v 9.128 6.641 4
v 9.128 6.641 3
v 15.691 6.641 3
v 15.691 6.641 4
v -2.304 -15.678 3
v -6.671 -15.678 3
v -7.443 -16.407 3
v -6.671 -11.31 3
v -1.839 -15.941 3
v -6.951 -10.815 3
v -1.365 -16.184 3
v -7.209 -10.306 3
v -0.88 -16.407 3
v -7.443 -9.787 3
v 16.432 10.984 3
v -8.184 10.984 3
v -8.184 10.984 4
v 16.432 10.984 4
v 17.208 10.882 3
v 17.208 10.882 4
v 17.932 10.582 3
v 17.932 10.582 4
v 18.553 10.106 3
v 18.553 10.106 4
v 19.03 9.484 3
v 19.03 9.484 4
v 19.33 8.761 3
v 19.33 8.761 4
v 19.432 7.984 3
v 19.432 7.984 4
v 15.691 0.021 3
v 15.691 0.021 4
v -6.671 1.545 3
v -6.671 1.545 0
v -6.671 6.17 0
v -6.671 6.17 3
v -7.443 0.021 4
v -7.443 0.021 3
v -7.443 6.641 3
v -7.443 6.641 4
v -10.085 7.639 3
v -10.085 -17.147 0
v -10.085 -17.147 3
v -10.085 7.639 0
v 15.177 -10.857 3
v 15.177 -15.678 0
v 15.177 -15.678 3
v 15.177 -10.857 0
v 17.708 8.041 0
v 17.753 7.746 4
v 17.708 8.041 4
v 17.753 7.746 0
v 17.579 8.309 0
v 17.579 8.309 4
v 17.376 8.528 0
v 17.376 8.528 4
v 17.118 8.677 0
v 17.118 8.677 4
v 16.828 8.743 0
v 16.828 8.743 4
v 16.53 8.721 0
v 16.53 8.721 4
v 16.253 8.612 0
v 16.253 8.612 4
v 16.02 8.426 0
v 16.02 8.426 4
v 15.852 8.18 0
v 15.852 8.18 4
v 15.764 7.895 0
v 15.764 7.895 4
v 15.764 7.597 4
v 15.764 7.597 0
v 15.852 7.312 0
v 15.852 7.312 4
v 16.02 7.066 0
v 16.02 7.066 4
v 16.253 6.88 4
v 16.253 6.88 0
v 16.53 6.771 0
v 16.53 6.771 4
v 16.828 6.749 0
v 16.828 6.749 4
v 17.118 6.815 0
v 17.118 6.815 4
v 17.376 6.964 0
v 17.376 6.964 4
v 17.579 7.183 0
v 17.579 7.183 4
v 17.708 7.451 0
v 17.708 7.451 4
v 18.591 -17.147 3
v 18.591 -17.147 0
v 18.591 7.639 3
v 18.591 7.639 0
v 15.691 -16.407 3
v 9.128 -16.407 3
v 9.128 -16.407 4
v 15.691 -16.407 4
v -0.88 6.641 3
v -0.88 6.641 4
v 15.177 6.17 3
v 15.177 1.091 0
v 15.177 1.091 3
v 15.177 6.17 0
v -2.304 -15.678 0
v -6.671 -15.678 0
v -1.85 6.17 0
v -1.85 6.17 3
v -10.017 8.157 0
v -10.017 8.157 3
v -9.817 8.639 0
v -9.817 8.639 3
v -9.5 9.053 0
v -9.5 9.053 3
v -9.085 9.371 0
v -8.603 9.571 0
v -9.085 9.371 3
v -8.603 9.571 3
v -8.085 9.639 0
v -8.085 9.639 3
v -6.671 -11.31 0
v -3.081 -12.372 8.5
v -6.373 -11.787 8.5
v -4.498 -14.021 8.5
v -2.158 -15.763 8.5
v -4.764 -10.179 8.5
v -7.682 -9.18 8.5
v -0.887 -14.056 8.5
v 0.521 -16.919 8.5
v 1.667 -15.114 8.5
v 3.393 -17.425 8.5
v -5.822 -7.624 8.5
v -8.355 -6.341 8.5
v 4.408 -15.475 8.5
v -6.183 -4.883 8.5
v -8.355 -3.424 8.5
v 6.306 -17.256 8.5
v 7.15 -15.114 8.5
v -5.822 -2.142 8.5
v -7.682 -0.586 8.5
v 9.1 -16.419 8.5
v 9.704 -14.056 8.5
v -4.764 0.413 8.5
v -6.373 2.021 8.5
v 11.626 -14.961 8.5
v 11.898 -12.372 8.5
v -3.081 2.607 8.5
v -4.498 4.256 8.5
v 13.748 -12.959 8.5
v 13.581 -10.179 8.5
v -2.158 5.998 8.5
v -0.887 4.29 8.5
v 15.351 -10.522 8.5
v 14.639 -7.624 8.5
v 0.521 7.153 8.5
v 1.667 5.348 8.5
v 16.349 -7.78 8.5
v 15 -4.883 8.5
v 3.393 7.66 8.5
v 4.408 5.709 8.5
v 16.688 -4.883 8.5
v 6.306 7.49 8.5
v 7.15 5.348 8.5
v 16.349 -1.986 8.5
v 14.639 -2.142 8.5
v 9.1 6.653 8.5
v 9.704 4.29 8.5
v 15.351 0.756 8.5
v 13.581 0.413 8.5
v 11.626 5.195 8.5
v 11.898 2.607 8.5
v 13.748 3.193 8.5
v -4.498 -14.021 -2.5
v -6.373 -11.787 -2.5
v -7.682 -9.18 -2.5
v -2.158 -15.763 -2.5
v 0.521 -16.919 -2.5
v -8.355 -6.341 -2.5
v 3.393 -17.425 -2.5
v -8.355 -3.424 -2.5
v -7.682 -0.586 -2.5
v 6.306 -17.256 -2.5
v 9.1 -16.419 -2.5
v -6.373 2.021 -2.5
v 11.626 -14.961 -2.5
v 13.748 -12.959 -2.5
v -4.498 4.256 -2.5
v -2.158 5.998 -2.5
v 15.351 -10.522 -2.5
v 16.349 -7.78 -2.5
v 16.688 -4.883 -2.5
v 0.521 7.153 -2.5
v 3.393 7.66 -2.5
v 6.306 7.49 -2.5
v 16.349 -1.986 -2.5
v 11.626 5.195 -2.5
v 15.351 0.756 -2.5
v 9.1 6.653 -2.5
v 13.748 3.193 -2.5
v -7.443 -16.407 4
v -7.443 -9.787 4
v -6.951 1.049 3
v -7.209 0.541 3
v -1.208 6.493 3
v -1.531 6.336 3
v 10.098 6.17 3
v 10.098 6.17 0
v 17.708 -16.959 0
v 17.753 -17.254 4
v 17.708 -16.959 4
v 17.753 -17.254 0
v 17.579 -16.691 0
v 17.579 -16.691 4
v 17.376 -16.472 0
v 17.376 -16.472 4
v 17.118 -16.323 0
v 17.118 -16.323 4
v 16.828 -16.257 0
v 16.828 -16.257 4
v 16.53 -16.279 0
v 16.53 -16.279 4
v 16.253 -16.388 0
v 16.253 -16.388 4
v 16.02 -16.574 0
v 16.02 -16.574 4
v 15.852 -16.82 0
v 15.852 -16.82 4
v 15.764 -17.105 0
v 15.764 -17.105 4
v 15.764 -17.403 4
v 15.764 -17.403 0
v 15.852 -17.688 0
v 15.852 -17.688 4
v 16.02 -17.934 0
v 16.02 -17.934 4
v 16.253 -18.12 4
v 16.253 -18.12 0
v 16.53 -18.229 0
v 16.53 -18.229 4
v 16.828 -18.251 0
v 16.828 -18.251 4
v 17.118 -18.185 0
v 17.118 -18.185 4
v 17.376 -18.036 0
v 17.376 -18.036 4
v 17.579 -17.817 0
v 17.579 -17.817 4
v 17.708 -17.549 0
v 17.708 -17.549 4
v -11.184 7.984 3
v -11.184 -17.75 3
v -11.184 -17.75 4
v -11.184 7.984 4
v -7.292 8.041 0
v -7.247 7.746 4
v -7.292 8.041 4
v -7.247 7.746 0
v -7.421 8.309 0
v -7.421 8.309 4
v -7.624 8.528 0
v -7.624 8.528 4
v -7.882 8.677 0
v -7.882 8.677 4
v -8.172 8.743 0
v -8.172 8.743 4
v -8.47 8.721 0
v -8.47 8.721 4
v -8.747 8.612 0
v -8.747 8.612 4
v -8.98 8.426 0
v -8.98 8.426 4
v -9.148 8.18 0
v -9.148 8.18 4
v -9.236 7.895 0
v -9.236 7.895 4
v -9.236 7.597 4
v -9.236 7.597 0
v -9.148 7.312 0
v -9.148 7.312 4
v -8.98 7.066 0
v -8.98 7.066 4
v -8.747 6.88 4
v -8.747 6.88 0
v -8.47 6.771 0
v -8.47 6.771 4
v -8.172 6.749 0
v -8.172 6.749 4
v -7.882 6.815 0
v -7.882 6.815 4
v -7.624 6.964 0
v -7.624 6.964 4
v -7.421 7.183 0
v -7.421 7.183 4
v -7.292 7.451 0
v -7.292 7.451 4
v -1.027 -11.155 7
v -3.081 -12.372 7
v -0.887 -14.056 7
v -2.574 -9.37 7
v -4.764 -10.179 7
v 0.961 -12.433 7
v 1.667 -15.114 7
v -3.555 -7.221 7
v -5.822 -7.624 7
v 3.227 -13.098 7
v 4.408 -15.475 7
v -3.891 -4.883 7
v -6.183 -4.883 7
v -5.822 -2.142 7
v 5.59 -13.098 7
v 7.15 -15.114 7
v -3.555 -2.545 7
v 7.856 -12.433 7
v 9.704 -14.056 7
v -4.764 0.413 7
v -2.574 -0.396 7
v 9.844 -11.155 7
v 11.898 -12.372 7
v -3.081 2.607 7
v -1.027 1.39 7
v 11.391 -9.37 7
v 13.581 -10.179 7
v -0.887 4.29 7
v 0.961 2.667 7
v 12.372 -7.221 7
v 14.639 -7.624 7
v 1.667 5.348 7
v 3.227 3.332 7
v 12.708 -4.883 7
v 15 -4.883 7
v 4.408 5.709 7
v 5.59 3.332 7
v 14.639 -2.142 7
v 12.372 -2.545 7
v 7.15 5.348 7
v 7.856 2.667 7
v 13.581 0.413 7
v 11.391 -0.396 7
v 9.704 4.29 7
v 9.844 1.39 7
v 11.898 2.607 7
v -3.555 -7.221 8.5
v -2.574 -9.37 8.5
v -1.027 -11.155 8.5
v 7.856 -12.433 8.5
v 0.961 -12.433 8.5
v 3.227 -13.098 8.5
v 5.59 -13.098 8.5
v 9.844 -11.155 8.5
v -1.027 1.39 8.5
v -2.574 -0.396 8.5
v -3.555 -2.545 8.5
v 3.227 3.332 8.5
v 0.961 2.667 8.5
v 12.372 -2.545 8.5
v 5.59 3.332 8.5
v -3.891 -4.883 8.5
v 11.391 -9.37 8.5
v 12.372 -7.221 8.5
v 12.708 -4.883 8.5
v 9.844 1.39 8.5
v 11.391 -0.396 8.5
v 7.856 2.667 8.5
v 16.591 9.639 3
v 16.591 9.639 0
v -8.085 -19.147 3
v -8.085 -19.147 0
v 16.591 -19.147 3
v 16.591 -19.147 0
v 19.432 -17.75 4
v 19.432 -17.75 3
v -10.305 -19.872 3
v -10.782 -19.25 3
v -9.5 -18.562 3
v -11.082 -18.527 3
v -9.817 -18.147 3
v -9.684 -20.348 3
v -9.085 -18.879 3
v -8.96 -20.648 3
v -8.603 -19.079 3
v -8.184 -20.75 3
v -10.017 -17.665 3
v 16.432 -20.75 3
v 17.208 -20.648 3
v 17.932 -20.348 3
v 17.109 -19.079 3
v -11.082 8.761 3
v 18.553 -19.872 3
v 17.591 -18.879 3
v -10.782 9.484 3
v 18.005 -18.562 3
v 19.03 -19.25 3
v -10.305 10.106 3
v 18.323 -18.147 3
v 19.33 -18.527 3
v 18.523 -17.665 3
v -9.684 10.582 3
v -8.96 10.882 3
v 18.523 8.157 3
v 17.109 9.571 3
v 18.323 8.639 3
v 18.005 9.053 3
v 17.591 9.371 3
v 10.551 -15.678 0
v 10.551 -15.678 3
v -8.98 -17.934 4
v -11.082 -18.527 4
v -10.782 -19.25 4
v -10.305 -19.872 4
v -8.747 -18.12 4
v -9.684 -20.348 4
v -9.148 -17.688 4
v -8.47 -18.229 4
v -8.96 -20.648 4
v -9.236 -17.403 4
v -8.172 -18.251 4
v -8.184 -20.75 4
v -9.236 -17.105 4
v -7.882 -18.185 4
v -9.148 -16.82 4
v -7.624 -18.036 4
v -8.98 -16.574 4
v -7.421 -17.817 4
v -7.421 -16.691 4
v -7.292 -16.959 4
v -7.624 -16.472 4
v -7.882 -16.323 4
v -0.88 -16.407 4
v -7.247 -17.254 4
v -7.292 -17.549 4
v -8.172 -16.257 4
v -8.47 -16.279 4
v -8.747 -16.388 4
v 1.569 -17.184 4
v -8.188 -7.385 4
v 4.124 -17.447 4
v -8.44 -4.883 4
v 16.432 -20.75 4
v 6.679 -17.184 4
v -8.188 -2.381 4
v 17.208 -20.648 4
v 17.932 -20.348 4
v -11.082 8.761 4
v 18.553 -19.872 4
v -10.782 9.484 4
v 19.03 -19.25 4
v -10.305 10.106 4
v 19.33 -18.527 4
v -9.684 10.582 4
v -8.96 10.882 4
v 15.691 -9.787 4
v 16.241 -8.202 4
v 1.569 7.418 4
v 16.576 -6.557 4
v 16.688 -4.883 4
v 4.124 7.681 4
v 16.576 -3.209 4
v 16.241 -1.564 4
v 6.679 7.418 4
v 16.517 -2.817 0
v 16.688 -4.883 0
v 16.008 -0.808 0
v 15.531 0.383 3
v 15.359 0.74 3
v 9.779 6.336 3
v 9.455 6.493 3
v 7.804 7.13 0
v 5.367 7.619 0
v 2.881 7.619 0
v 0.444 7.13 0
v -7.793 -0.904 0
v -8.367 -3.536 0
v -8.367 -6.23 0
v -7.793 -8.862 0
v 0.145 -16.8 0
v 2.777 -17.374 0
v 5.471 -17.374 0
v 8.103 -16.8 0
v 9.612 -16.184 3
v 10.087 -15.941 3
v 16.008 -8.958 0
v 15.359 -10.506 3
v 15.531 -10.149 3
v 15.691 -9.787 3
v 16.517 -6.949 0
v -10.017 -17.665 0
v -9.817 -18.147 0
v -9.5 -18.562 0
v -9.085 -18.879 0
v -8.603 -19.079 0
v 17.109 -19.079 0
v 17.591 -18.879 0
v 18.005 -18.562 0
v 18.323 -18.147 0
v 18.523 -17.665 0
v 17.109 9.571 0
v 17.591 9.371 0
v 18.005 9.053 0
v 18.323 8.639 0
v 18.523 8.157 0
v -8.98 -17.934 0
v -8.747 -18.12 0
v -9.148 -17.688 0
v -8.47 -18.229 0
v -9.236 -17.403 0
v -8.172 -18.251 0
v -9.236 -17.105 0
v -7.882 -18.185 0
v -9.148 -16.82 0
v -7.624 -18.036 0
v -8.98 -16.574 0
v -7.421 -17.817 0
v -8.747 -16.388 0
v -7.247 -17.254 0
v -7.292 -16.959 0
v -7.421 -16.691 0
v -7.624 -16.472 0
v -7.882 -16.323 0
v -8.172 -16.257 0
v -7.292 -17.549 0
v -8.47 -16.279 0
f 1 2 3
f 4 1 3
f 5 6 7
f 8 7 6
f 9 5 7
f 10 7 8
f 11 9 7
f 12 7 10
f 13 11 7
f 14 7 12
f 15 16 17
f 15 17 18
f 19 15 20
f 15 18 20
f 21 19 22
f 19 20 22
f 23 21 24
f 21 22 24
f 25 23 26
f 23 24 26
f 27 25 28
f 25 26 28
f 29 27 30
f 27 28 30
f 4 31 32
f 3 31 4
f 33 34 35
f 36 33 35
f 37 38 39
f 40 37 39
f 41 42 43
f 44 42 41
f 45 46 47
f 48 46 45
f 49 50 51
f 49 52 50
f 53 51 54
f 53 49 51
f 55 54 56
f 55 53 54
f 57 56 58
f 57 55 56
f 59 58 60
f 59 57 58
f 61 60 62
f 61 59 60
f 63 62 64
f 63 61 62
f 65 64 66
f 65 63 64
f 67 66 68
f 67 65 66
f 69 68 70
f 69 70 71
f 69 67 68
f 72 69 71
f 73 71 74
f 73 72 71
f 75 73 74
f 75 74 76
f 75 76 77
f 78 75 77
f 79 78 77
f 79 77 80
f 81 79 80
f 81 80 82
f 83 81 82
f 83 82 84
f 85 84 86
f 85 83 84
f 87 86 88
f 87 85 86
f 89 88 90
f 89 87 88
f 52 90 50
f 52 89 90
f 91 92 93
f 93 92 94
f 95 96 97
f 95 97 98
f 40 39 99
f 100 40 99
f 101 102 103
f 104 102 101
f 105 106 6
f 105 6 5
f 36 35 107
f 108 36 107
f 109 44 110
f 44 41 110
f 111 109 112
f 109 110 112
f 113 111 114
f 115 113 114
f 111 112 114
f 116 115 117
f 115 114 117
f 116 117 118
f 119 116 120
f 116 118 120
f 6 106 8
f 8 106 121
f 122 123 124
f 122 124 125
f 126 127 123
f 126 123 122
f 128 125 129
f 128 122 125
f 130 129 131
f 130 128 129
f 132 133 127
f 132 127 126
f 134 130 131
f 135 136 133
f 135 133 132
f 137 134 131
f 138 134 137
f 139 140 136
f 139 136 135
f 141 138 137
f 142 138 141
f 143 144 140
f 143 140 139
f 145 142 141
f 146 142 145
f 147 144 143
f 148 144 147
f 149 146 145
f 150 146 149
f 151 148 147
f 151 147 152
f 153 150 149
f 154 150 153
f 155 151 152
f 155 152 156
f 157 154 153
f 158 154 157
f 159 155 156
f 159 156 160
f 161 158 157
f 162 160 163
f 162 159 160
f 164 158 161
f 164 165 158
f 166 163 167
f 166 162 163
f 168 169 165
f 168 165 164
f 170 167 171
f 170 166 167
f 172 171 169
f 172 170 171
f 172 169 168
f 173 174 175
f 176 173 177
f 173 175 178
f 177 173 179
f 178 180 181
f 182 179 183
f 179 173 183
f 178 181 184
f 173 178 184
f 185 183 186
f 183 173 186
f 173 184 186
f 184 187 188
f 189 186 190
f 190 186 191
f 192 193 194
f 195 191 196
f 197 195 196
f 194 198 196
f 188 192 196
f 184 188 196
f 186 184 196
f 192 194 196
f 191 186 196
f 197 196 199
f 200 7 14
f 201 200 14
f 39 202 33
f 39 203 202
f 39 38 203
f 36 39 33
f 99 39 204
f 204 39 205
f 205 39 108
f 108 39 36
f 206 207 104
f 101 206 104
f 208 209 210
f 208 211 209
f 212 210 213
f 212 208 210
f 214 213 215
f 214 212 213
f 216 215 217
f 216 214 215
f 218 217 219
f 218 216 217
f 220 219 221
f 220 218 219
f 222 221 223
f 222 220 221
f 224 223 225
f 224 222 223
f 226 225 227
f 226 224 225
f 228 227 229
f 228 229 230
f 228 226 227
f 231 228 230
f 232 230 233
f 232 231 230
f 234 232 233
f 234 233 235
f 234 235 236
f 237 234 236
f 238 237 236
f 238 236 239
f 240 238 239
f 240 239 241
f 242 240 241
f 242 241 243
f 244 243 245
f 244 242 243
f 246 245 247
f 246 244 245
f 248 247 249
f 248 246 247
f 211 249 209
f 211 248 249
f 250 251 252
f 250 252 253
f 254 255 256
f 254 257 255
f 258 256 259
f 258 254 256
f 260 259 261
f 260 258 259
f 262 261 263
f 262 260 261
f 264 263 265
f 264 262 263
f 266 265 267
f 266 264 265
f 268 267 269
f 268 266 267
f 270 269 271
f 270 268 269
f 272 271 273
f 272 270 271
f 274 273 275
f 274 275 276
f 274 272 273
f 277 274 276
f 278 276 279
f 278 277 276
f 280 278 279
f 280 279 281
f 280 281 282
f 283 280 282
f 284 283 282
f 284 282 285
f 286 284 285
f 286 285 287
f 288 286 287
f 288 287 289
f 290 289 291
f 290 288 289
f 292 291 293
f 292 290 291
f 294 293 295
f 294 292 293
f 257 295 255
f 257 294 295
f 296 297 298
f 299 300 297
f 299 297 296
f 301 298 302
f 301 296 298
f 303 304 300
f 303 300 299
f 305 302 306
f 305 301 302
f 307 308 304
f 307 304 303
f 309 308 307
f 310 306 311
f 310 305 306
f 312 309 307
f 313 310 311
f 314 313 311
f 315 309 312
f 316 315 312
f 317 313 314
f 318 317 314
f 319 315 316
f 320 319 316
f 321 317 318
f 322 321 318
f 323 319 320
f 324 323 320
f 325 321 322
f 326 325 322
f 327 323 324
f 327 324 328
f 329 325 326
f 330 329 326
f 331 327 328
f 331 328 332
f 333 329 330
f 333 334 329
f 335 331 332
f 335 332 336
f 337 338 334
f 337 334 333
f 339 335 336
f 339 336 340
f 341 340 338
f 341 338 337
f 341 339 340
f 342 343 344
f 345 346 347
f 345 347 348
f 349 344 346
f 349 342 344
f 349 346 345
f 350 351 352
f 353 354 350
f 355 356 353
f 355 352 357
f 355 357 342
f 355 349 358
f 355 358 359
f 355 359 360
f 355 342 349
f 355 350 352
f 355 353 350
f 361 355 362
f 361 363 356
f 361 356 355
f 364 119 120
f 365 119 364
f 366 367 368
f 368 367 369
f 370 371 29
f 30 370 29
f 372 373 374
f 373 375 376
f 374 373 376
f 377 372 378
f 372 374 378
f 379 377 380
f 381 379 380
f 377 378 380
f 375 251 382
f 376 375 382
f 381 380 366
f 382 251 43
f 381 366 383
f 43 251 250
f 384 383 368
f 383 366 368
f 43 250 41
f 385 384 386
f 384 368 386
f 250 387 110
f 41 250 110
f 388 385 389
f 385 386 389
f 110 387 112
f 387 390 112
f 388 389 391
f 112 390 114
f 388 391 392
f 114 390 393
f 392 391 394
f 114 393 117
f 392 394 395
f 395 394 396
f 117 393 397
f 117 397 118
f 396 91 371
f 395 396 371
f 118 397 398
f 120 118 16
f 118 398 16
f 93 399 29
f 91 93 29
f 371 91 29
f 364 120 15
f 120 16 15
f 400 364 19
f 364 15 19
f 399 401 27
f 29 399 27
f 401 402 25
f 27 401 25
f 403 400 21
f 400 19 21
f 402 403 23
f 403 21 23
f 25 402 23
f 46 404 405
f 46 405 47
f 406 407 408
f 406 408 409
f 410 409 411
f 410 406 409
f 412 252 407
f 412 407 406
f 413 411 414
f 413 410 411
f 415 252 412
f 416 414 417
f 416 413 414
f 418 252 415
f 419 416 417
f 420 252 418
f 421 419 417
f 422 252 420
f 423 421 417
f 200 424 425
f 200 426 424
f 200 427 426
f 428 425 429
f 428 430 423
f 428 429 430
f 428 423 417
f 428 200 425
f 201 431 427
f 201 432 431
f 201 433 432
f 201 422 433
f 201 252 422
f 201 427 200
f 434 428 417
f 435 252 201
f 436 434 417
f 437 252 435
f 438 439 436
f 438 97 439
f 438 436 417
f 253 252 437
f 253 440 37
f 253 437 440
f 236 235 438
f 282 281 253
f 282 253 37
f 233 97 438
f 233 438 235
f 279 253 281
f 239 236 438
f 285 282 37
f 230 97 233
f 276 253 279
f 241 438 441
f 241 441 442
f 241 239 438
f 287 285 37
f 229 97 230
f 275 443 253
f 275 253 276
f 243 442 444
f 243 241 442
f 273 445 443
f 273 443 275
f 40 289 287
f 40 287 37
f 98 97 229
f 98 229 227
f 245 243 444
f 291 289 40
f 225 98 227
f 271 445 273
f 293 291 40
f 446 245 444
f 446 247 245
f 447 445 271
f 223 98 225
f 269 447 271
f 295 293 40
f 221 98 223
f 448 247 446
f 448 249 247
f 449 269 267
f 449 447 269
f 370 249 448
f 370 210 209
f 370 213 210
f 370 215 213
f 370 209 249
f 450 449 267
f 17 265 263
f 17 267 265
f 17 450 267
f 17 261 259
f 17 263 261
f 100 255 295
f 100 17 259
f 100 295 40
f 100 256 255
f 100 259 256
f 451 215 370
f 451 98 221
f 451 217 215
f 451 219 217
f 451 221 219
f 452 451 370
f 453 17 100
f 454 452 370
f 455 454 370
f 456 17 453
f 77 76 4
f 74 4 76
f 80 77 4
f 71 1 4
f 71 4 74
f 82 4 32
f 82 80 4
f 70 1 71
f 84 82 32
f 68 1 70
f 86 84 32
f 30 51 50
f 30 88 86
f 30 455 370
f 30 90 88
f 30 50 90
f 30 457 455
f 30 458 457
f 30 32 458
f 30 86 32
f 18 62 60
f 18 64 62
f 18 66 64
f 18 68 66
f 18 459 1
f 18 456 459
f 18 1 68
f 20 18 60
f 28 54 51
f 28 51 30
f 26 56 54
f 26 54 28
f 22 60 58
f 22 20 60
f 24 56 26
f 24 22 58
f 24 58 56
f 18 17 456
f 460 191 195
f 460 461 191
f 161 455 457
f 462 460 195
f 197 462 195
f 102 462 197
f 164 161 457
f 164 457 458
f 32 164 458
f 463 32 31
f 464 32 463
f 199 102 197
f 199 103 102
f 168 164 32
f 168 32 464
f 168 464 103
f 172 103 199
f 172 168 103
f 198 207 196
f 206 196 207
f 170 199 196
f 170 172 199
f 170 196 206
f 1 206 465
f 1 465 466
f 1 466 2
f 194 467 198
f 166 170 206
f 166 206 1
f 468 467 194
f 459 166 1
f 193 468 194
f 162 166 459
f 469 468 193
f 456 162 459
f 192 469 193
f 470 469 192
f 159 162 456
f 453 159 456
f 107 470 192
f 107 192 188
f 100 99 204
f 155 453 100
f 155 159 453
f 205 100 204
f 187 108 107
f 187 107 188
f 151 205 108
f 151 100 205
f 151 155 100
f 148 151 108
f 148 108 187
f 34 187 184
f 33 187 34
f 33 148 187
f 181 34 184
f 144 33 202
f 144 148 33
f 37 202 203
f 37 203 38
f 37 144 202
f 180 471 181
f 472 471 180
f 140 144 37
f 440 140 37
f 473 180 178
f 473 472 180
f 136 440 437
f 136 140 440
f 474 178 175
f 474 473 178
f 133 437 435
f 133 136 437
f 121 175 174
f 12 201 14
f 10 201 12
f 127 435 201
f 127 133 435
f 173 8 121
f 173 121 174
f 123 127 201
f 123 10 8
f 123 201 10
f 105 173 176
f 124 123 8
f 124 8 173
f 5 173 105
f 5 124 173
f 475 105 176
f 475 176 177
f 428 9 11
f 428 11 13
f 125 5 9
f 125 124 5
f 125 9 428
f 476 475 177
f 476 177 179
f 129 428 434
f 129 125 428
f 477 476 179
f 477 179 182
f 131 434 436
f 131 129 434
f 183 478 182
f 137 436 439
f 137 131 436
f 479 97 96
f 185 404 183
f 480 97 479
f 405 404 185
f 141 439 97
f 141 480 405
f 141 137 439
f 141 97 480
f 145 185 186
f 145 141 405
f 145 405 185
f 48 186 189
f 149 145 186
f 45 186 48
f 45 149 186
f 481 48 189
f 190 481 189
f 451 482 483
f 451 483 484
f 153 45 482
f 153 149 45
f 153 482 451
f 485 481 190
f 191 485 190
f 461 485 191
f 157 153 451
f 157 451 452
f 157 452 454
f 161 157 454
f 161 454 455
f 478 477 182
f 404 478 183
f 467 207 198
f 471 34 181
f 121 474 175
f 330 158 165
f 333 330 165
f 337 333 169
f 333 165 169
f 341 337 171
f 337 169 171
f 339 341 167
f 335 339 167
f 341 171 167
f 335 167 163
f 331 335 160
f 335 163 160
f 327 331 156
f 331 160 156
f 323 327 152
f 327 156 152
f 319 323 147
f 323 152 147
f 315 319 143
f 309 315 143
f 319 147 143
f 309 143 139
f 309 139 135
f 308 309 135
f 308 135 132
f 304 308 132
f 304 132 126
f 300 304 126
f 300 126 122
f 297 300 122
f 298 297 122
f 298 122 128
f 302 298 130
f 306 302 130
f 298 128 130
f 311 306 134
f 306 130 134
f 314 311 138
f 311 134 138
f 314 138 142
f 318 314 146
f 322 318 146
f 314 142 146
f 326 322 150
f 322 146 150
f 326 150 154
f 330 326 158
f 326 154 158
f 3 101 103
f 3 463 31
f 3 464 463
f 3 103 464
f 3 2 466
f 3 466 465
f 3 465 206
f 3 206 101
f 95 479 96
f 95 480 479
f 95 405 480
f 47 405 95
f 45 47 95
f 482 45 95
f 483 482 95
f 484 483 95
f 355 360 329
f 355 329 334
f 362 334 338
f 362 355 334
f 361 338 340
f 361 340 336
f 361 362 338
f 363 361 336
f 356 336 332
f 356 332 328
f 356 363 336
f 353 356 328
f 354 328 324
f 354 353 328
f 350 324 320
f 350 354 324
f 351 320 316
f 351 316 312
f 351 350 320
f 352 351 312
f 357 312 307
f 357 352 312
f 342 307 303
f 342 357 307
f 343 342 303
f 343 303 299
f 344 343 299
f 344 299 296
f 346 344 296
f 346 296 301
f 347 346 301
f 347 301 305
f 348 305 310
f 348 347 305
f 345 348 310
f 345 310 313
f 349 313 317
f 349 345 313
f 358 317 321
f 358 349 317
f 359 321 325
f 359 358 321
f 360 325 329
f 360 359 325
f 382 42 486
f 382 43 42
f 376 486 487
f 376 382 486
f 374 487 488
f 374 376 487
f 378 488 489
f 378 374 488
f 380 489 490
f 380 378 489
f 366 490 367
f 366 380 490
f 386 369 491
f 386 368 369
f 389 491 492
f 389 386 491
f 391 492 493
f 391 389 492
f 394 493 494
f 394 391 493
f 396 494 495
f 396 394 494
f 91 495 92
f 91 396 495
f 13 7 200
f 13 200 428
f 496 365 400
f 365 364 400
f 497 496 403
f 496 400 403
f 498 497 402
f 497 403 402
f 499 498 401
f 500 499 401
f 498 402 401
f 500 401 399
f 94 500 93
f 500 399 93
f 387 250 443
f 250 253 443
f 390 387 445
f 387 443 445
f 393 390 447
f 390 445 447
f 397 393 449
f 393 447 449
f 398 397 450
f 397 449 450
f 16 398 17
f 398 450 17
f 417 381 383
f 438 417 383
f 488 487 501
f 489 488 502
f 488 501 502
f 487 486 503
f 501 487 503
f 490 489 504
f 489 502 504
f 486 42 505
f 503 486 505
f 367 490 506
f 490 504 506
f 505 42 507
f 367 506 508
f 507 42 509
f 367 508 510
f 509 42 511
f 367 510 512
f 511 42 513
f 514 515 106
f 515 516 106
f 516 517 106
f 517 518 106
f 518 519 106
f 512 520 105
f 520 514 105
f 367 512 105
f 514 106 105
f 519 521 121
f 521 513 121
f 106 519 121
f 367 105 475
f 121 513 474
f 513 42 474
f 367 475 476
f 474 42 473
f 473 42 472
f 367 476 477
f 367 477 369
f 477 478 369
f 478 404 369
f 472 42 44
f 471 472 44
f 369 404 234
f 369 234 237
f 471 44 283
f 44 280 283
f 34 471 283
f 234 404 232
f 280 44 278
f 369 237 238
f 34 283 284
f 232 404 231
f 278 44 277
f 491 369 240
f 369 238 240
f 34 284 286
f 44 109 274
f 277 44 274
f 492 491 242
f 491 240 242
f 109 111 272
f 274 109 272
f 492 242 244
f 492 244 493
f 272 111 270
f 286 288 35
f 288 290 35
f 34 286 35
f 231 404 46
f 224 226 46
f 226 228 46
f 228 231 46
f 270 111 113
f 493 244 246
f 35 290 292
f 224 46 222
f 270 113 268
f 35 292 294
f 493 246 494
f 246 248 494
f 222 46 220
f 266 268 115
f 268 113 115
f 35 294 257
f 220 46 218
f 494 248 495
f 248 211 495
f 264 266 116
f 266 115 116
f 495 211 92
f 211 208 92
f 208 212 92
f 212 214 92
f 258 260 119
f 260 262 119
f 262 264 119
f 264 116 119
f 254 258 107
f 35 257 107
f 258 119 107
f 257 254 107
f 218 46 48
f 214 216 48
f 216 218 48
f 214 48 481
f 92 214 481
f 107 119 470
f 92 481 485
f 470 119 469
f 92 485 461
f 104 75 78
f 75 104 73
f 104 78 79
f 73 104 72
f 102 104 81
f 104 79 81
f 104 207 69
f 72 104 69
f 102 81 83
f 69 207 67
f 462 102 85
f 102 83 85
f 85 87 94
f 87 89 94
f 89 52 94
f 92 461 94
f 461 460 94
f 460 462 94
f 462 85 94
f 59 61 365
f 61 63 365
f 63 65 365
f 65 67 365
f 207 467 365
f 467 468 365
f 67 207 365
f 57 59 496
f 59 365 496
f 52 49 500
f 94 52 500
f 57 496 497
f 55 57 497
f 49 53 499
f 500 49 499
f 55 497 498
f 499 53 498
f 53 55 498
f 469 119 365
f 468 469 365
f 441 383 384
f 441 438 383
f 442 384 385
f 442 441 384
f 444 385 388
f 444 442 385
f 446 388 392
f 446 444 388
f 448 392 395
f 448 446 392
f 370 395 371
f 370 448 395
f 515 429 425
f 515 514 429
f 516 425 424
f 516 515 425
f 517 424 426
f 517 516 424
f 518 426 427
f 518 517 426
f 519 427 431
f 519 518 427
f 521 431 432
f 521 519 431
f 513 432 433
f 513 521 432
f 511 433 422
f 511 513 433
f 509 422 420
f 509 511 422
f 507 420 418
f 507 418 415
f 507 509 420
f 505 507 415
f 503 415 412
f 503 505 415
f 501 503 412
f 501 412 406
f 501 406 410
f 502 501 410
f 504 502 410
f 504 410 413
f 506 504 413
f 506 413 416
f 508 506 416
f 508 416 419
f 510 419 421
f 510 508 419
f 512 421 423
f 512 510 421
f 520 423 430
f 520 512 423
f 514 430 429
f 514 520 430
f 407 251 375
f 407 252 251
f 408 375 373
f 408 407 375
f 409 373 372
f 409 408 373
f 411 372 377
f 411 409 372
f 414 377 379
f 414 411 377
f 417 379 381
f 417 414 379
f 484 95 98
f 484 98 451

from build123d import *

# Parameters (mm, degrees)
SKETCH_1_W          = 28.676374442
SKETCH_1_H          = 28.786423303
SKETCH_1_R          = 1
SKETCH_1_W_2        = 21.847787884
SKETCH_1_H_2        = 21.847787883
EXTRUDE_1_DEPTH     = 3
FILLET_1_R          = 2
SKETCH_2_R          = 12.563691981
EXTRUDE_2_DEPTH     = 5.5
SKETCH_3_W          = 30.61596727
SKETCH_3_H          = 31.734673245
SKETCH_3_R          = 1
SKETCH_3_W_2        = 23.133890408
SKETCH_3_H_2        = 23.048584014
EXTRUDE_3_DEPTH     = 1
SKETCH_5_R          = 10.591689203
SKETCH_5_R_2        = 8.299790342
CUT_EXTRUDE_1_DEPTH = 1.5
FILLET_2_R          = 3


with BuildPart() as part:
    # 草图1 → 凸台-拉伸1 (new body)
    with BuildSketch(Plane.XY):
        with Locations((4.252772695, -4.754098361)):
            Rectangle(SKETCH_1_W, SKETCH_1_H)
        with Locations((-8.247227305, 7.745901639)):
            Circle(SKETCH_1_R, mode=Mode.SUBTRACT)
        with Locations((16.752772695, 7.745901639)):
            Circle(SKETCH_1_R, mode=Mode.SUBTRACT)
        with Locations((16.752772695, -17.254098361)):
            Circle(SKETCH_1_R, mode=Mode.SUBTRACT)
        with Locations((-8.247227305, -17.254098361)):
            Circle(SKETCH_1_R, mode=Mode.SUBTRACT)
        with Locations((4.252772695, -4.754098361)):
            Rectangle(SKETCH_1_W_2, SKETCH_1_H_2, mode=Mode.SUBTRACT)
    extrude(amount=EXTRUDE_1_DEPTH)

    # 圆角1
    fillet_1_edges = [part.edges().sort_by_distance(p)[0] for p in [
        (18.590959916, -19.147310012, 1.5),
        (-10.085414526, -19.147310012, 1.5),
        (-10.085414526, 9.639113291, 1.5),
        (18.590959916, 9.639113291, 1.5),
    ]]
    fillet(fillet_1_edges, radius=FILLET_1_R)

    # 草图2 → 凸台-拉伸2 (add, symmetric)
    with BuildSketch(Plane.XY.offset(3)):
        with Locations((4.123944992, -4.882926064)):
            Circle(SKETCH_2_R)
    extrude(amount=EXTRUDE_2_DEPTH, both=True)

    # 草图3 → 凸台-拉伸3 (add)
    with BuildSketch(Plane.XY.offset(3)):
        with Locations((4.123944992, -4.882926064)):
            Rectangle(SKETCH_3_W, SKETCH_3_H)
        with Locations((-8.247227305, 7.745901639)):
            Circle(SKETCH_3_R, mode=Mode.SUBTRACT)
        with Locations((-8.247227305, -17.254098361)):
            Circle(SKETCH_3_R, mode=Mode.SUBTRACT)
        with Locations((16.752772695, -17.254098361)):
            Circle(SKETCH_3_R, mode=Mode.SUBTRACT)
        with Locations((16.752772695, 7.745901639)):
            Circle(SKETCH_3_R, mode=Mode.SUBTRACT)
        with Locations((4.123944992, -4.882926064)):
            Rectangle(SKETCH_3_W_2, SKETCH_3_H_2, mode=Mode.SUBTRACT)
    extrude(amount=EXTRUDE_3_DEPTH)

    # 草图5 → 切除-拉伸1 (cut)
    with BuildSketch(Plane.XY.offset(8.5)):
        with Locations((4.408371776, -4.882926064)):
            Circle(SKETCH_5_R)
        with Locations((4.408371776, -4.882926064)):
            Circle(SKETCH_5_R_2, mode=Mode.SUBTRACT)
    extrude(amount=-CUT_EXTRUDE_1_DEPTH, mode=Mode.SUBTRACT)

    # 圆角2
    fillet_2_edges = [part.edges().sort_by_distance(p)[0] for p in [
        (19.431928627, -20.750262686, 3.5),
        (19.431928627, 10.984410559, 3.5),
        (-11.184038643, 10.984410559, 3.5),
        (-11.184038643, -20.750262686, 3.5),
    ]]
    fillet(fillet_2_edges, radius=FILLET_2_R)


solid = part.part
